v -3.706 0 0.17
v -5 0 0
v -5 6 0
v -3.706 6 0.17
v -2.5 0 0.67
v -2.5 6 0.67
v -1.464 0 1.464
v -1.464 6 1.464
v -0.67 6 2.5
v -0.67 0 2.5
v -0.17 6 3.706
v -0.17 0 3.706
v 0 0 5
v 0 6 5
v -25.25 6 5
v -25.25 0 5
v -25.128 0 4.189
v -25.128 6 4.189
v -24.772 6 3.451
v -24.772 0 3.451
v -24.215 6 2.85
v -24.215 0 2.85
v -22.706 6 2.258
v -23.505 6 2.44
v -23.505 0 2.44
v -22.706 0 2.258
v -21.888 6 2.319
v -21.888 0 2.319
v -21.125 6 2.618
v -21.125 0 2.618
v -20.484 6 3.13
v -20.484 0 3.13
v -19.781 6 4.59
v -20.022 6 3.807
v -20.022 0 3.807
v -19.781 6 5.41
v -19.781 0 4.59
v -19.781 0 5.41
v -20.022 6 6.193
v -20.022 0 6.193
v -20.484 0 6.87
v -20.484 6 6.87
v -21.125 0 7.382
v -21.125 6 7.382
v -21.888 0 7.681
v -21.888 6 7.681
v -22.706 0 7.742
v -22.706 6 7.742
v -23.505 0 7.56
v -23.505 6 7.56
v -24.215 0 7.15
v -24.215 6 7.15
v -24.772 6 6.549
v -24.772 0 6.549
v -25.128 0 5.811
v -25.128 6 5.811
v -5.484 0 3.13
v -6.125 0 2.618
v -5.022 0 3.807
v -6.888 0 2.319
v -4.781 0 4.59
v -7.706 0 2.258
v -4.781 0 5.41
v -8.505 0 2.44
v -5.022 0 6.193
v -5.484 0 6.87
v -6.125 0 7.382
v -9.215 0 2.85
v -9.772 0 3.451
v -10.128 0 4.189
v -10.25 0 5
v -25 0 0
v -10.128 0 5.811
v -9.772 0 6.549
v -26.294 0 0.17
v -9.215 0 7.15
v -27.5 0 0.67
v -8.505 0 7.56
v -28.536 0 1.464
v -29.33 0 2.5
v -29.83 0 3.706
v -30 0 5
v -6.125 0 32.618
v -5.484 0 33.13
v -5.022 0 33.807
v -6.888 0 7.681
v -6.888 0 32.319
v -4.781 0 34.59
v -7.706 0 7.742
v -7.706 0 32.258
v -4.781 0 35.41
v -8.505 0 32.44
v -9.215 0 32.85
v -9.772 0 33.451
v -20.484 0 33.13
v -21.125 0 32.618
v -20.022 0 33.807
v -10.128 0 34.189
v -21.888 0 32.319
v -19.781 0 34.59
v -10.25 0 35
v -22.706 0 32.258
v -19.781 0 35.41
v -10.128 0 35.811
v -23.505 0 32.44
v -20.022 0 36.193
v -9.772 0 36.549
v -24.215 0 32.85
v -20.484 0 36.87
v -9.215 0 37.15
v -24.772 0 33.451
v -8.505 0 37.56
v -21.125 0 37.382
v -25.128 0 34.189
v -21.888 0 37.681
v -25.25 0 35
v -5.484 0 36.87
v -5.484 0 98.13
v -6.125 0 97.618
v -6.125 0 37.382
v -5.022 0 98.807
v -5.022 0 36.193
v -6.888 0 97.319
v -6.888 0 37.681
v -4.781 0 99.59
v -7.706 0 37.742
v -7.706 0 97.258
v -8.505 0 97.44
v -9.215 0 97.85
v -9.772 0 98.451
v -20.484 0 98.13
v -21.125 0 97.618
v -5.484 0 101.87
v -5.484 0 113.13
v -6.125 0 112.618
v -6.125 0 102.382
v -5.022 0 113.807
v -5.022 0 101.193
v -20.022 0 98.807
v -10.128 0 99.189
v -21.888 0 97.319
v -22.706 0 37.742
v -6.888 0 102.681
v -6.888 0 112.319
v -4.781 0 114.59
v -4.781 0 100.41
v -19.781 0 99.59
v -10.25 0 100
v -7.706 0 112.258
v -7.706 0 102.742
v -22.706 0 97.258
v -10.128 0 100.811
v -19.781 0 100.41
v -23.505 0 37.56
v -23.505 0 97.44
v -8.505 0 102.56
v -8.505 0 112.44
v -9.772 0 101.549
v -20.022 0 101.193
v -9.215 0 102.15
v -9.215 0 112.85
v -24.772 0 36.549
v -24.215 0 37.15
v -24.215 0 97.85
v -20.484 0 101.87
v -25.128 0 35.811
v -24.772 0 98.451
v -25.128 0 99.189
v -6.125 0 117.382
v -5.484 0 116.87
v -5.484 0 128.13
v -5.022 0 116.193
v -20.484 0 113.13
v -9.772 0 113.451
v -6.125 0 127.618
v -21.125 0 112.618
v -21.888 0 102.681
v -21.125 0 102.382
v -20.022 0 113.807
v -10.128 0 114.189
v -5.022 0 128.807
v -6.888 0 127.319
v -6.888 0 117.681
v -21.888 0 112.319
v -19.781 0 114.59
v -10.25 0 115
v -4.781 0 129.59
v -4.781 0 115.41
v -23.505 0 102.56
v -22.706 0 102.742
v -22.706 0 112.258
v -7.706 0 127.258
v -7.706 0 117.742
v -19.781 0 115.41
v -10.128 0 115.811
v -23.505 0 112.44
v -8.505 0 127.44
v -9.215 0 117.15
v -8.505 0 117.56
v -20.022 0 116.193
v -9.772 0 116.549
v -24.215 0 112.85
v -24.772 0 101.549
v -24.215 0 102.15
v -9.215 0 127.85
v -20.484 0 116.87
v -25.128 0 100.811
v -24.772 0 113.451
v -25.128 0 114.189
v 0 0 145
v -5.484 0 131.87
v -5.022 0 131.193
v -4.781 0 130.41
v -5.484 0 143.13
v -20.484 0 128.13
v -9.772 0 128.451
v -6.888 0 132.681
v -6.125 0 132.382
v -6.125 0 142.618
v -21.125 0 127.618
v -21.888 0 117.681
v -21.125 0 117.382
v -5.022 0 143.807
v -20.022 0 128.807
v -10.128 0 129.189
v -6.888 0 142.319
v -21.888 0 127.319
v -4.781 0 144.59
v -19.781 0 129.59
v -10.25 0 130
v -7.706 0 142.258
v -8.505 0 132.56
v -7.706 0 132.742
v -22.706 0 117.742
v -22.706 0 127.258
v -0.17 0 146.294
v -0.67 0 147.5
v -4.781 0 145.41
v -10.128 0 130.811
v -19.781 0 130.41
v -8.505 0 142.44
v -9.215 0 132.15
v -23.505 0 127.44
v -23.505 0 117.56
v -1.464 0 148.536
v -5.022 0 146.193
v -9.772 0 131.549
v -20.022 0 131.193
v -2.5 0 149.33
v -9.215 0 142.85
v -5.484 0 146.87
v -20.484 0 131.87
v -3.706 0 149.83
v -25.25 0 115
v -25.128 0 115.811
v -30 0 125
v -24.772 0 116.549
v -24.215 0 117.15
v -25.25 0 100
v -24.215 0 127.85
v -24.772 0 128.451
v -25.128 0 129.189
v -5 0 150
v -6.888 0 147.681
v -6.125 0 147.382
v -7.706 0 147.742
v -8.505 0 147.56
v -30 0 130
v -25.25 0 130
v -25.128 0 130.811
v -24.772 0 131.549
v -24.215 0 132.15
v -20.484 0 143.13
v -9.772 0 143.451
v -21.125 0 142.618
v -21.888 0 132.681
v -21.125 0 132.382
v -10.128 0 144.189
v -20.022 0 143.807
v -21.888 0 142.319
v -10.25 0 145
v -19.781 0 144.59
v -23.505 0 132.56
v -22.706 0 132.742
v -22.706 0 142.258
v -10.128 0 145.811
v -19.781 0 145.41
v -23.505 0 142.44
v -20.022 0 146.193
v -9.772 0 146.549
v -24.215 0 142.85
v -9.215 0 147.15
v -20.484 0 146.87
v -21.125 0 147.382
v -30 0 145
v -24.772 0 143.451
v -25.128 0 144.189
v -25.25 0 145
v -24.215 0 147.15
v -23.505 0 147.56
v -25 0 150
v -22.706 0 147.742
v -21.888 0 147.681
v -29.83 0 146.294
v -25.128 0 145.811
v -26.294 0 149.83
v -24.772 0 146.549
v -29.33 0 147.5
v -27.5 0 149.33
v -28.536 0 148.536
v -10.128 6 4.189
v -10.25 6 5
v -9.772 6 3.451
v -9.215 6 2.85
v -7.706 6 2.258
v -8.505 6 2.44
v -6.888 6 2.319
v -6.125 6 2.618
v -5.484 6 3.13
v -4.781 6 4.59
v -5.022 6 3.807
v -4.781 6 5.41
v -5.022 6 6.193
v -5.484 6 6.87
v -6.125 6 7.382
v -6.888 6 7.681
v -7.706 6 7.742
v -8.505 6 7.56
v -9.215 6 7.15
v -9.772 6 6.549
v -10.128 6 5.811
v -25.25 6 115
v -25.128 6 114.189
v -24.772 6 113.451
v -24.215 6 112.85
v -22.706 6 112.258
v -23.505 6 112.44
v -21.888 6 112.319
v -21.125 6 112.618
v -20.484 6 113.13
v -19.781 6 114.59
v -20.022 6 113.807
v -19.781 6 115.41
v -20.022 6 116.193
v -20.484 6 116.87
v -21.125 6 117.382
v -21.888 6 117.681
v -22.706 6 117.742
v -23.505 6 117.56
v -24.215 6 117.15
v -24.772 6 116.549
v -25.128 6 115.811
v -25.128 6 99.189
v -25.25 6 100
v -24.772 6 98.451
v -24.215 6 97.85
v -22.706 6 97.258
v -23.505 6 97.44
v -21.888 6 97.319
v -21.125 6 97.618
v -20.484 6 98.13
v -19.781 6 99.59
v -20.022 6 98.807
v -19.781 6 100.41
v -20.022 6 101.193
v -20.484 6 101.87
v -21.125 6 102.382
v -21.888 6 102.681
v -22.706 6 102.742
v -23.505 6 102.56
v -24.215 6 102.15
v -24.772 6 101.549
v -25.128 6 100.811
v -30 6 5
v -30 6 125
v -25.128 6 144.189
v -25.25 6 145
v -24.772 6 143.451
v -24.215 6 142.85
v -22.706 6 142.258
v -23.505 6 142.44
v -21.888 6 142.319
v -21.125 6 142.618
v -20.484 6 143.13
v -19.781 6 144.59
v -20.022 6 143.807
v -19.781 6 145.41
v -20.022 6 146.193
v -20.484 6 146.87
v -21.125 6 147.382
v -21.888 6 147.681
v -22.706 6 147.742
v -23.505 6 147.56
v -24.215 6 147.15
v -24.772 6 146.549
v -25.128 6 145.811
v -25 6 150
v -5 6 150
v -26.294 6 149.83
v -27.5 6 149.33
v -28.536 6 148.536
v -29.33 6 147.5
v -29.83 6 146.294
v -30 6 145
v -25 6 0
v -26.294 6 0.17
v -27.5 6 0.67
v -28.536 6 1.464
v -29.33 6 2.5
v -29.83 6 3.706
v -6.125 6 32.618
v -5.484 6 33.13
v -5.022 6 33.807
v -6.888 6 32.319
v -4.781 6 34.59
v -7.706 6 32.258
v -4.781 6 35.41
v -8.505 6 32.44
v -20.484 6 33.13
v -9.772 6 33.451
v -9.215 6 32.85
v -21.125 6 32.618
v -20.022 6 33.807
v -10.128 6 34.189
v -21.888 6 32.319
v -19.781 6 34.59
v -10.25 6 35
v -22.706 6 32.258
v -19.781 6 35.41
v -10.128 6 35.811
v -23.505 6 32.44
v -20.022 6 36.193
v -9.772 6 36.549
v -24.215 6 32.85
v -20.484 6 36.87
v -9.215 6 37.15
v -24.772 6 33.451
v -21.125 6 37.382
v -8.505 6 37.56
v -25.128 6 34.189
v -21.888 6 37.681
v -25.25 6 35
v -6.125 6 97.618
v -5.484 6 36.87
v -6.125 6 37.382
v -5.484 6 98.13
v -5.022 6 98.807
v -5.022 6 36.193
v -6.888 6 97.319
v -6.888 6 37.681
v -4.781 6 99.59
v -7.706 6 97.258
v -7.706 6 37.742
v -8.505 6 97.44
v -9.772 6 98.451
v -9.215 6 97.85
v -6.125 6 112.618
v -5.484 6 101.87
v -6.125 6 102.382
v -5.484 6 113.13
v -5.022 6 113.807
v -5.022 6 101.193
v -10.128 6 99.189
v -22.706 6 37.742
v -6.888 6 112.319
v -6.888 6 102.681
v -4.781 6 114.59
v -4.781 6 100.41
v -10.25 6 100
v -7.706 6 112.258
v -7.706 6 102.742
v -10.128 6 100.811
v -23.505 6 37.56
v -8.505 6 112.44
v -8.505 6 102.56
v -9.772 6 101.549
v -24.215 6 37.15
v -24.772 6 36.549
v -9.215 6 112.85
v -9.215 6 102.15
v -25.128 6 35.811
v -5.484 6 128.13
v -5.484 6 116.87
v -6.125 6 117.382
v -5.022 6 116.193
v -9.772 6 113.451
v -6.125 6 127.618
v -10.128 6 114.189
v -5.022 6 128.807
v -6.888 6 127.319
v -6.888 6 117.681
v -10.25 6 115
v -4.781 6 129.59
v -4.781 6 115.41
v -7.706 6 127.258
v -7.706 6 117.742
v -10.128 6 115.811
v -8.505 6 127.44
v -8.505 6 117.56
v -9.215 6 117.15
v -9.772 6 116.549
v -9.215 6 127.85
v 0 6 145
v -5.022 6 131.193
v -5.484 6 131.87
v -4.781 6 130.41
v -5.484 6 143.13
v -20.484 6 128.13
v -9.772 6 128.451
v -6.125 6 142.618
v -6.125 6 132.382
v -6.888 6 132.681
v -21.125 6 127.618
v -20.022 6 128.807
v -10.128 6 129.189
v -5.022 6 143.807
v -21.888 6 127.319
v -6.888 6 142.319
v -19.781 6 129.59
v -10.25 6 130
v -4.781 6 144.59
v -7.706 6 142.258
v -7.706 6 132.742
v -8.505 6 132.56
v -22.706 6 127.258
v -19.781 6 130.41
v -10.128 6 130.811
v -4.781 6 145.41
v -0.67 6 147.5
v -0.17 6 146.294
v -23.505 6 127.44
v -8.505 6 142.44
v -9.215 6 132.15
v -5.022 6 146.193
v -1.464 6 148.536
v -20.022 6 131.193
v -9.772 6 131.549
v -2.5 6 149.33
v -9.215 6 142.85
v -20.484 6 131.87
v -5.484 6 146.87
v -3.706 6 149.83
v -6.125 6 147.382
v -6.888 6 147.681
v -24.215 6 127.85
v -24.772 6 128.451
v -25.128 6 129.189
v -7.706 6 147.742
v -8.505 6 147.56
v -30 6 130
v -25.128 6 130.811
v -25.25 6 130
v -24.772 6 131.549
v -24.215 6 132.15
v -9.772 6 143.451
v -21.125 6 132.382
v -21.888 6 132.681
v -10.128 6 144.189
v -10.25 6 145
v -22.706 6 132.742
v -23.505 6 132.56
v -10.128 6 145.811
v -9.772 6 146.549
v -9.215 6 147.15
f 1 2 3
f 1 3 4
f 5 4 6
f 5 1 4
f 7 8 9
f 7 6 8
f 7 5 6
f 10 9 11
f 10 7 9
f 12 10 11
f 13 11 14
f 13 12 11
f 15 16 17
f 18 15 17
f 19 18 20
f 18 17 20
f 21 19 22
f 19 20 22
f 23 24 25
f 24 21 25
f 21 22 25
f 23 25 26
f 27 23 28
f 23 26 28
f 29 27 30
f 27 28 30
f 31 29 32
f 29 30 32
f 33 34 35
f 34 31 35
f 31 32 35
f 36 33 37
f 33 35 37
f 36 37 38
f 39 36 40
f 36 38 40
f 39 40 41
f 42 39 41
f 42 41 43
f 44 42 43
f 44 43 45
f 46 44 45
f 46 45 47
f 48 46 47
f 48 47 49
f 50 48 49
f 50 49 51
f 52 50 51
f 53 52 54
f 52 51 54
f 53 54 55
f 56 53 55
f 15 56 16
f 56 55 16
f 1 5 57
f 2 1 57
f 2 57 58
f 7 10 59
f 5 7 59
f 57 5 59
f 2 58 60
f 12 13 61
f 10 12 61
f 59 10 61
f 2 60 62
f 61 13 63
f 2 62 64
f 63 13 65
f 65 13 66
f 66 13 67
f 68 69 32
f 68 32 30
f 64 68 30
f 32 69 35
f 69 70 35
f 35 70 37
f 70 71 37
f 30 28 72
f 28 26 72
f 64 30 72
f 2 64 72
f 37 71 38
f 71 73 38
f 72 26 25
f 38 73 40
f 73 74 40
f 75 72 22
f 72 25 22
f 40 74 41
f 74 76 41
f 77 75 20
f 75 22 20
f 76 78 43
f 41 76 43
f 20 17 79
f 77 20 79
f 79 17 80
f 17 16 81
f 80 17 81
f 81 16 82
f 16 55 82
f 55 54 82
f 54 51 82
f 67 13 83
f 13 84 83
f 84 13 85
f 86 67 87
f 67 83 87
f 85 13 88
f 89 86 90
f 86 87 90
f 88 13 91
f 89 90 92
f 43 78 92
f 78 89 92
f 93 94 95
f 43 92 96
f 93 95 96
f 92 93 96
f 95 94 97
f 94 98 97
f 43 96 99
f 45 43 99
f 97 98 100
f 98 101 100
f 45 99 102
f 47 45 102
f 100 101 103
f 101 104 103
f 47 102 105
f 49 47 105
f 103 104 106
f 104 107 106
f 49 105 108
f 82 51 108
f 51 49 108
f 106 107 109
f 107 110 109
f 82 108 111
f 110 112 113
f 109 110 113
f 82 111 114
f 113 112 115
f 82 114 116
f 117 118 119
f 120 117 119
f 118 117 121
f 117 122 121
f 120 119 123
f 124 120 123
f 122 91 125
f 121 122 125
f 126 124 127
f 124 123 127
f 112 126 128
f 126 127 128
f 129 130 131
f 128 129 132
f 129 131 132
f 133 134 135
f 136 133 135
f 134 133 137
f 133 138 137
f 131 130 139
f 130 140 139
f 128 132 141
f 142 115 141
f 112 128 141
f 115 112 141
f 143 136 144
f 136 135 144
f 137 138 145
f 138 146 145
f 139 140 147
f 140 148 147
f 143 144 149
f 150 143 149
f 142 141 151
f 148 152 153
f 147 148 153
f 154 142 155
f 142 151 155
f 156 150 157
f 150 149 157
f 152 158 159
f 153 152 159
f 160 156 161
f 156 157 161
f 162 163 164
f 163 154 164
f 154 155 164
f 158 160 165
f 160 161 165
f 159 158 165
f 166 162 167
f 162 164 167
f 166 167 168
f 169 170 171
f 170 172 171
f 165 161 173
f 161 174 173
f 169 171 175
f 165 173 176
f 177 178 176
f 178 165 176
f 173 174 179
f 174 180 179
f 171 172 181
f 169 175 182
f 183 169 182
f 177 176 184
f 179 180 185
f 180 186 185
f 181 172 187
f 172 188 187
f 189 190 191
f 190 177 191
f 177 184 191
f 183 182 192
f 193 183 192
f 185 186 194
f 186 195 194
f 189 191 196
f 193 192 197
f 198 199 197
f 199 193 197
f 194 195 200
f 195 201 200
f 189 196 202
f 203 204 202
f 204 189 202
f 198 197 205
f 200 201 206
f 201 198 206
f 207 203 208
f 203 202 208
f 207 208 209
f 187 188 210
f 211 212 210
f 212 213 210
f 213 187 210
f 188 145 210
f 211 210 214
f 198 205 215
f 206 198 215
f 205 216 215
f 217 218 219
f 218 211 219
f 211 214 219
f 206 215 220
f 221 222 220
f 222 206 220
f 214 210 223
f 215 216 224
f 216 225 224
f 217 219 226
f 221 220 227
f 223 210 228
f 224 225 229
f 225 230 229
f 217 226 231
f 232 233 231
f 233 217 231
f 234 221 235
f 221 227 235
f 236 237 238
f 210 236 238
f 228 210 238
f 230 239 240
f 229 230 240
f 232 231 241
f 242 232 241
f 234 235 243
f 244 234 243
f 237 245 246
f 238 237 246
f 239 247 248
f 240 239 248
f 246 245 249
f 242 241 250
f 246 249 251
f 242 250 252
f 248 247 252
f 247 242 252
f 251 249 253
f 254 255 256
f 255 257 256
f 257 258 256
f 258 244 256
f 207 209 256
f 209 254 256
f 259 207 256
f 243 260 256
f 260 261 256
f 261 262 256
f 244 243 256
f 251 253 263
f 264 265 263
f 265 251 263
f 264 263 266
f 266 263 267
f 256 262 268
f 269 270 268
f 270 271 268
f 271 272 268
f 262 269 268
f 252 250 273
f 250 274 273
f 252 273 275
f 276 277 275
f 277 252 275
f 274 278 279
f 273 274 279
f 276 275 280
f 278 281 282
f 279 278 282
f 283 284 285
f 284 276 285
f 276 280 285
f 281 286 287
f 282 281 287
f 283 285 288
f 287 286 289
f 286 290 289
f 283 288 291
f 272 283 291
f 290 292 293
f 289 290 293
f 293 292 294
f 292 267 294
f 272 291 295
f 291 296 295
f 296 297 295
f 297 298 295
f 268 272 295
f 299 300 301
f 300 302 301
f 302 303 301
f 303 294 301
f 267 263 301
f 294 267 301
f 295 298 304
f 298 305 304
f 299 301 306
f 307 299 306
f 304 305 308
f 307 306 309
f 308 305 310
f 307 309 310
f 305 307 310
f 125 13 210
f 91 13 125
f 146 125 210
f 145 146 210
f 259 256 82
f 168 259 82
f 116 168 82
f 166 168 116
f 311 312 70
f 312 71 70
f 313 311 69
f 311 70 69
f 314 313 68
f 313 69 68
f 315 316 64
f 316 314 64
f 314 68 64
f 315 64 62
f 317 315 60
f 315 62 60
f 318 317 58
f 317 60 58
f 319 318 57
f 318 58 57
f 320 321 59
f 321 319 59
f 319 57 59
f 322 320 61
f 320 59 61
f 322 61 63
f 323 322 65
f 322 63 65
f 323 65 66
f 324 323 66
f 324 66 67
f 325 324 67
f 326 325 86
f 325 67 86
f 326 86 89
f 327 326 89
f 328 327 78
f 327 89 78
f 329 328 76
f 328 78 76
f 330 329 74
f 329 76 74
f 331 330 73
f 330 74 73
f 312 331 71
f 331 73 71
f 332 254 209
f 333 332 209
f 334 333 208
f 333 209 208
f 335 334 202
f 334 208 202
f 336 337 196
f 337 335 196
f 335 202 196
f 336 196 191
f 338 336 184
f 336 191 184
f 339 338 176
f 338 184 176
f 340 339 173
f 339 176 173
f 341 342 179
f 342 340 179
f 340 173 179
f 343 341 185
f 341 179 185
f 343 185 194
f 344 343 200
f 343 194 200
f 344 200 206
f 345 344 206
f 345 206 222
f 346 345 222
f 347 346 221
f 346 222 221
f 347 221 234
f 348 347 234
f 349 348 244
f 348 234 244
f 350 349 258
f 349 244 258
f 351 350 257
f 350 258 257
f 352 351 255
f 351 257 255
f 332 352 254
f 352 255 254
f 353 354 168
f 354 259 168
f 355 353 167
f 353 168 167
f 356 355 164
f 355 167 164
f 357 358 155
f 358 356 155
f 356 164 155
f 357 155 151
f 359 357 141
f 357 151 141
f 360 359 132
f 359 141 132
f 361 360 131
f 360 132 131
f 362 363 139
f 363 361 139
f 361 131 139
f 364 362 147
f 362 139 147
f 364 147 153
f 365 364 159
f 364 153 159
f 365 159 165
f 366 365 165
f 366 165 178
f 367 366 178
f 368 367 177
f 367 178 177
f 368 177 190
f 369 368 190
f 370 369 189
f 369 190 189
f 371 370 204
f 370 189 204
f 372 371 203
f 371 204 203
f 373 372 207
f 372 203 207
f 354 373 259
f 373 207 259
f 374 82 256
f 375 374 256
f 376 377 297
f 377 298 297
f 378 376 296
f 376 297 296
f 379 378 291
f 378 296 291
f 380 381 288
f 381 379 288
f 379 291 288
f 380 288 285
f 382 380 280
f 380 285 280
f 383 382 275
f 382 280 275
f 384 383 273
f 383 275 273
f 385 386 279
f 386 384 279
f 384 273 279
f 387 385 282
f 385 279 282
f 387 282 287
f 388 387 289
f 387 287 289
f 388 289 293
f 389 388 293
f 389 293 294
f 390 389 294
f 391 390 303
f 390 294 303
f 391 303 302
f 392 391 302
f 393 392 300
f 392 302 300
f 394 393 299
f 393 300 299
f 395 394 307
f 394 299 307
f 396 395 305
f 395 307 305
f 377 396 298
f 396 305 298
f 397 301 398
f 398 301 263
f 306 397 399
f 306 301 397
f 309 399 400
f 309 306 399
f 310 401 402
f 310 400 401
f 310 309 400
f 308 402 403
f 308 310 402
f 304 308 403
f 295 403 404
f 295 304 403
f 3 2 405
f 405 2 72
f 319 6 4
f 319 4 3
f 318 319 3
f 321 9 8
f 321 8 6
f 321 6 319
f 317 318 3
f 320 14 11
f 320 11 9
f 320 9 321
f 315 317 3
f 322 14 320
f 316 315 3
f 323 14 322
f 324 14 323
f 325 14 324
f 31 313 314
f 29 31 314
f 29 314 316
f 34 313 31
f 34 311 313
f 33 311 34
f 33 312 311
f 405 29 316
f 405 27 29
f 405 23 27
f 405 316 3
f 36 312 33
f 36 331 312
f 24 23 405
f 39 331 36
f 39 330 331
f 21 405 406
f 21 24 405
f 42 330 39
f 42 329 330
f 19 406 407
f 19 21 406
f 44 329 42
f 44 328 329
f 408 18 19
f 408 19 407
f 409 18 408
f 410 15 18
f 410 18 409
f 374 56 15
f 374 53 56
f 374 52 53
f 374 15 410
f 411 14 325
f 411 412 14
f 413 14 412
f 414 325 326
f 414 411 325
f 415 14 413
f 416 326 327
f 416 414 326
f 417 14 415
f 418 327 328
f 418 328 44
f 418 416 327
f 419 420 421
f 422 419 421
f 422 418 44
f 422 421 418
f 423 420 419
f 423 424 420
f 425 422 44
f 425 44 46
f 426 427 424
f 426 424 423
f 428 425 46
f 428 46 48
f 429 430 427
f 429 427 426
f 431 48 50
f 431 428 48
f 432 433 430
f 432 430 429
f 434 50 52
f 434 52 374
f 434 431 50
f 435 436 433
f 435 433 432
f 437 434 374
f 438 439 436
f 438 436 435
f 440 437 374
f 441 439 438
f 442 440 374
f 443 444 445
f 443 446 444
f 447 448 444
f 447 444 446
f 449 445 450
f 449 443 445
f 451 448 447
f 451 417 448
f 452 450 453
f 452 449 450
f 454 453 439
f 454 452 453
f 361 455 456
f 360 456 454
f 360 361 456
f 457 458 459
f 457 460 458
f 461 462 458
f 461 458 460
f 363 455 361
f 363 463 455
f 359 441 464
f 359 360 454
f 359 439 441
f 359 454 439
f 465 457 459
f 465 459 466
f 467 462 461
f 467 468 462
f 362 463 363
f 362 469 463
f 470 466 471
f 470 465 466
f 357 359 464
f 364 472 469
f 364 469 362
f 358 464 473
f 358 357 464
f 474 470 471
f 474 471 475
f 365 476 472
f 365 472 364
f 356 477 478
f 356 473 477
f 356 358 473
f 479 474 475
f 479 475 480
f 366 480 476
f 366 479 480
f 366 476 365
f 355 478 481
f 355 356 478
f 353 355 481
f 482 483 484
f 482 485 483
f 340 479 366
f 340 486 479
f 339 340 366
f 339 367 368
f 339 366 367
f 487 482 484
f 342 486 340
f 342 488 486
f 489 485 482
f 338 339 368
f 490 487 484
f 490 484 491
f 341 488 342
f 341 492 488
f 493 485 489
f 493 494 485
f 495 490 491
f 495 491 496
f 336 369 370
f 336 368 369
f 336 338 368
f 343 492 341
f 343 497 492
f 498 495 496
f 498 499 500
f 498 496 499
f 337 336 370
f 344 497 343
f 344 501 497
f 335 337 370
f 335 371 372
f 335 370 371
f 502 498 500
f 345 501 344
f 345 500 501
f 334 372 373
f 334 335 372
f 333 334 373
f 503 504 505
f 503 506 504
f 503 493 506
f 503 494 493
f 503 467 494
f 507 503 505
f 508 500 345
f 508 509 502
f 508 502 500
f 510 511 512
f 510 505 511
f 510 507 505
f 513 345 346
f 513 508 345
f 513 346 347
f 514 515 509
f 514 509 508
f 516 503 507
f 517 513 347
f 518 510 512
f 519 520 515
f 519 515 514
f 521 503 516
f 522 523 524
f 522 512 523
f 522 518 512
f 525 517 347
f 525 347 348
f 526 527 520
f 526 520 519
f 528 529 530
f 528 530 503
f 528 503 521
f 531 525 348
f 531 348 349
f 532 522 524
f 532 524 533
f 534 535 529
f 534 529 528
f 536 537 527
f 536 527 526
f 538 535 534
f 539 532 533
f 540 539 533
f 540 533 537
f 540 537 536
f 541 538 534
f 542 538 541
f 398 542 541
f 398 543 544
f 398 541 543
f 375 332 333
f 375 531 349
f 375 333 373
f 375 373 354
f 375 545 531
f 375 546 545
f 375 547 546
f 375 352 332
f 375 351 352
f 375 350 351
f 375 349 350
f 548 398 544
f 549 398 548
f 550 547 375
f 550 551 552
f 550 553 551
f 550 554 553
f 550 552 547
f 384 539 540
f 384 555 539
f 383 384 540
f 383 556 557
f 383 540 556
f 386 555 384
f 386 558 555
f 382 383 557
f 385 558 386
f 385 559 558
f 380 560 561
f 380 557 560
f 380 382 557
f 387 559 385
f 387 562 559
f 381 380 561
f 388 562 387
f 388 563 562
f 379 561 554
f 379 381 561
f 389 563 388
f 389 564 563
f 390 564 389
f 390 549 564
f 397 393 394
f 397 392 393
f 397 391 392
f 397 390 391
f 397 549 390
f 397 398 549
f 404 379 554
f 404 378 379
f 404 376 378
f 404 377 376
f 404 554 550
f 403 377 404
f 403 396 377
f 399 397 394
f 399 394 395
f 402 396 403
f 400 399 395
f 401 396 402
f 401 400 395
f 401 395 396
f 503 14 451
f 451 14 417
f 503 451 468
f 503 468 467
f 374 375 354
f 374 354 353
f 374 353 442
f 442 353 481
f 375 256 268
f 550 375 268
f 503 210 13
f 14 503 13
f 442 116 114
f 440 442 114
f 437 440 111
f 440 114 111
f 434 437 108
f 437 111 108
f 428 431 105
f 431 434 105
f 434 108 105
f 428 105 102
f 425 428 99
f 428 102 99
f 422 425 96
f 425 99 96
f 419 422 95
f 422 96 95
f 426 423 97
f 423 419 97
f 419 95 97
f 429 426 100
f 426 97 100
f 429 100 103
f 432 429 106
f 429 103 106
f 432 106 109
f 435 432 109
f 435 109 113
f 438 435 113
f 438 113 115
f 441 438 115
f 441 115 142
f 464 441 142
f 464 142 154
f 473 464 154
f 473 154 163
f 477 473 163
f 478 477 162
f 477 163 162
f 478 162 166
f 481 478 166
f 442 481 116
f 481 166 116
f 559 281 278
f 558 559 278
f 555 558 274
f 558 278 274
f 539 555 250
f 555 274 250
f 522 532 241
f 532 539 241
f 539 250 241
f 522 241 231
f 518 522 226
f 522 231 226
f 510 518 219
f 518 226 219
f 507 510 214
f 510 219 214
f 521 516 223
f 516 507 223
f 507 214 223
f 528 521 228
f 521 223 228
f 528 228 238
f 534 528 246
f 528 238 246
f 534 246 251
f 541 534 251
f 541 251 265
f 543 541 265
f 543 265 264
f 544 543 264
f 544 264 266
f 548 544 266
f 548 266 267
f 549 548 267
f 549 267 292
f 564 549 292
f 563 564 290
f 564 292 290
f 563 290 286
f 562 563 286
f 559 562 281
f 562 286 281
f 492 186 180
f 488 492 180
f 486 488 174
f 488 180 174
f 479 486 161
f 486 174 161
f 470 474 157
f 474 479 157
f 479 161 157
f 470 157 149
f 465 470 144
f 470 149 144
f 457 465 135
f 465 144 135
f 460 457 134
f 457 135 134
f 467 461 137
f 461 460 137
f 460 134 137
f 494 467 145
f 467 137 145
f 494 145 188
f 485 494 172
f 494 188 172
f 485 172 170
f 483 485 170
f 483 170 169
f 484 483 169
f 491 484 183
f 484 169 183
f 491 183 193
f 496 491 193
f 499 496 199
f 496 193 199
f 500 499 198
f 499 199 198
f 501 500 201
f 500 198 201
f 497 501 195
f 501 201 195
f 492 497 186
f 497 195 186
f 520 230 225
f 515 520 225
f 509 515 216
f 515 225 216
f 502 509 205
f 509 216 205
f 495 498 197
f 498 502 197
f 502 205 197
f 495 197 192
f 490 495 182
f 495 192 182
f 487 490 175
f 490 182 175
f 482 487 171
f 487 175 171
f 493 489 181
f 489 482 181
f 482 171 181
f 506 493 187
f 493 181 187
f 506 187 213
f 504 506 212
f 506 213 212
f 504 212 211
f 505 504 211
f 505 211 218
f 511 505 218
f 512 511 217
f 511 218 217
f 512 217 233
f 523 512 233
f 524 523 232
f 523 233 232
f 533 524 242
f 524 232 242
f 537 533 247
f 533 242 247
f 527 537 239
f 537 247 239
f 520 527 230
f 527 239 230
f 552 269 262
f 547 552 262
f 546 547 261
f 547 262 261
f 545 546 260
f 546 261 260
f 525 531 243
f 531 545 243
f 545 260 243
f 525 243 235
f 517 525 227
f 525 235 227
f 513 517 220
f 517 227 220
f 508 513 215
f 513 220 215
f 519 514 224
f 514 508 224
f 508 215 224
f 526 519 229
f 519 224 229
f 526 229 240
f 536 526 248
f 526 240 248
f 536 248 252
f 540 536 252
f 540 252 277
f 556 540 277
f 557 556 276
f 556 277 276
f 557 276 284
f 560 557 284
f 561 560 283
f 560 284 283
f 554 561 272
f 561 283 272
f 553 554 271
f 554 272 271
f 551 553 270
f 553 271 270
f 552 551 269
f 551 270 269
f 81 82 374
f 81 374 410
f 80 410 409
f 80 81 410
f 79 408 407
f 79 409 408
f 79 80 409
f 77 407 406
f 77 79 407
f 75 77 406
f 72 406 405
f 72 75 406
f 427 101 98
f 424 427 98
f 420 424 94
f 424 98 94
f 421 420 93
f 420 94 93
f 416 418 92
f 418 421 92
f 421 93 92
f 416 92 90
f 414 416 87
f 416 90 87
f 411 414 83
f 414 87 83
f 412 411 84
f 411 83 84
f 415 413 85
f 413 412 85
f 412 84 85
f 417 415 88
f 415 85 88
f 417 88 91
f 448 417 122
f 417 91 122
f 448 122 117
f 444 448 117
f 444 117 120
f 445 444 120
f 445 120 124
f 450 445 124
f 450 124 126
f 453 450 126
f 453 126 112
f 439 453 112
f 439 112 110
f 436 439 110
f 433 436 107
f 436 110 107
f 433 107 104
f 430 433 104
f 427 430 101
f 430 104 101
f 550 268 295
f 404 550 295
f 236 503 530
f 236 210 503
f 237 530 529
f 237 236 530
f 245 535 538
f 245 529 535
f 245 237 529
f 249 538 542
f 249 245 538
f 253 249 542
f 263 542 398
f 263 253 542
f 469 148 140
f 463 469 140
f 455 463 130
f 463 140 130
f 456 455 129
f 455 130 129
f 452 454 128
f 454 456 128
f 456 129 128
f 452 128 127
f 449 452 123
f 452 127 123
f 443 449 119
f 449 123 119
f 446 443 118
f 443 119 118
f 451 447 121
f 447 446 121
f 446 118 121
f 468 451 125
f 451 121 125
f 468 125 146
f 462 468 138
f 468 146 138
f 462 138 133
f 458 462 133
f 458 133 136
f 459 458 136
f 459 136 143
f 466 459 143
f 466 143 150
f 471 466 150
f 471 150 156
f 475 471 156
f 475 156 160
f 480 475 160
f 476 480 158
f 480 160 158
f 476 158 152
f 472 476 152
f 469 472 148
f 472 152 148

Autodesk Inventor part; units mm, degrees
ref_plane "YZ Plane" through (0, 0, 0) normal (1, 0, 0) x (0, 1, 0)
ref_plane "XZ Plane" through (0, 0, 0) normal (0, 1, 0) x (-1, 0, 0)
ref_plane "XY Plane" through (0, 0, 0) normal (0, 0, 1) x (1, 0, 0)
sketch "Sketch7" plane through (0, 0, 0) normal (0, 1, 0) x (-1, 0, 0)
  line L0 (5, 0) -> (25, 0)
  line L1 (30, 5) -> (30, 150)
  line L2 (25, 150) -> (5, 150)
  line L3 (0, 145) -> (0, 5)
  line L4 (30, 145) -> (30, 145)
  line L5 (30, 145) -> (22.5, 145)
  circle A0 centre (22.5, 145) radius 2.75
  circle A1 centre (22.5, 130) radius 2.75
  circle A2 centre (7.5, 145) radius 2.75
  circle A3 centre (7.5, 130) radius 2.75
  line L6 (22.5, 130) -> (30, 130)
  line L7 (30, 130) -> (30, 125)
  circle A4 centre (22.5, 35) radius 2.75
  circle A5 centre (22.5, 5) radius 2.75
  circle A6 centre (7.5, 35) radius 2.75
  circle A7 centre (7.5, 5) radius 2.75
  circle A8 centre (22.5, 115) radius 2.75
  circle A9 centre (7.5, 115) radius 2.75
  circle A10 centre (22.5, 100) radius 2.75
  circle A11 centre (7.5, 100) radius 2.75
  arc A12 (30, 145) -> (25, 150) centre (25, 145) ccw
  arc A13 (5, 150) -> (0, 145) centre (5, 145) ccw
  arc A14 (25, 0) -> (30, 5) centre (25, 5) ccw
  arc A15 (0, 5) -> (5, 0) centre (5, 5) ccw
  point P0 (0, 0)
  point P1 (30, 0)
  point P2 (0, 150)
  dimension "d141" = 30
  dimension "d142" = 150
  dimension "d143" = 5
  dimension "d144" = 7.5
  dimension "d145" = 5.5
  dimension "d148" = 15
  dimension "d151" = 15
  dimension "d154" = 5
  dimension "d159" = 5.5
  dimension "d160" = 30
  dimension "d161" = 15
  dimension "d162" = 5
extrude "Extrusion5" add sketch "Sketch7" along normal blind 6
properties part number "GARFO" material "Aluminium AW-7020"
